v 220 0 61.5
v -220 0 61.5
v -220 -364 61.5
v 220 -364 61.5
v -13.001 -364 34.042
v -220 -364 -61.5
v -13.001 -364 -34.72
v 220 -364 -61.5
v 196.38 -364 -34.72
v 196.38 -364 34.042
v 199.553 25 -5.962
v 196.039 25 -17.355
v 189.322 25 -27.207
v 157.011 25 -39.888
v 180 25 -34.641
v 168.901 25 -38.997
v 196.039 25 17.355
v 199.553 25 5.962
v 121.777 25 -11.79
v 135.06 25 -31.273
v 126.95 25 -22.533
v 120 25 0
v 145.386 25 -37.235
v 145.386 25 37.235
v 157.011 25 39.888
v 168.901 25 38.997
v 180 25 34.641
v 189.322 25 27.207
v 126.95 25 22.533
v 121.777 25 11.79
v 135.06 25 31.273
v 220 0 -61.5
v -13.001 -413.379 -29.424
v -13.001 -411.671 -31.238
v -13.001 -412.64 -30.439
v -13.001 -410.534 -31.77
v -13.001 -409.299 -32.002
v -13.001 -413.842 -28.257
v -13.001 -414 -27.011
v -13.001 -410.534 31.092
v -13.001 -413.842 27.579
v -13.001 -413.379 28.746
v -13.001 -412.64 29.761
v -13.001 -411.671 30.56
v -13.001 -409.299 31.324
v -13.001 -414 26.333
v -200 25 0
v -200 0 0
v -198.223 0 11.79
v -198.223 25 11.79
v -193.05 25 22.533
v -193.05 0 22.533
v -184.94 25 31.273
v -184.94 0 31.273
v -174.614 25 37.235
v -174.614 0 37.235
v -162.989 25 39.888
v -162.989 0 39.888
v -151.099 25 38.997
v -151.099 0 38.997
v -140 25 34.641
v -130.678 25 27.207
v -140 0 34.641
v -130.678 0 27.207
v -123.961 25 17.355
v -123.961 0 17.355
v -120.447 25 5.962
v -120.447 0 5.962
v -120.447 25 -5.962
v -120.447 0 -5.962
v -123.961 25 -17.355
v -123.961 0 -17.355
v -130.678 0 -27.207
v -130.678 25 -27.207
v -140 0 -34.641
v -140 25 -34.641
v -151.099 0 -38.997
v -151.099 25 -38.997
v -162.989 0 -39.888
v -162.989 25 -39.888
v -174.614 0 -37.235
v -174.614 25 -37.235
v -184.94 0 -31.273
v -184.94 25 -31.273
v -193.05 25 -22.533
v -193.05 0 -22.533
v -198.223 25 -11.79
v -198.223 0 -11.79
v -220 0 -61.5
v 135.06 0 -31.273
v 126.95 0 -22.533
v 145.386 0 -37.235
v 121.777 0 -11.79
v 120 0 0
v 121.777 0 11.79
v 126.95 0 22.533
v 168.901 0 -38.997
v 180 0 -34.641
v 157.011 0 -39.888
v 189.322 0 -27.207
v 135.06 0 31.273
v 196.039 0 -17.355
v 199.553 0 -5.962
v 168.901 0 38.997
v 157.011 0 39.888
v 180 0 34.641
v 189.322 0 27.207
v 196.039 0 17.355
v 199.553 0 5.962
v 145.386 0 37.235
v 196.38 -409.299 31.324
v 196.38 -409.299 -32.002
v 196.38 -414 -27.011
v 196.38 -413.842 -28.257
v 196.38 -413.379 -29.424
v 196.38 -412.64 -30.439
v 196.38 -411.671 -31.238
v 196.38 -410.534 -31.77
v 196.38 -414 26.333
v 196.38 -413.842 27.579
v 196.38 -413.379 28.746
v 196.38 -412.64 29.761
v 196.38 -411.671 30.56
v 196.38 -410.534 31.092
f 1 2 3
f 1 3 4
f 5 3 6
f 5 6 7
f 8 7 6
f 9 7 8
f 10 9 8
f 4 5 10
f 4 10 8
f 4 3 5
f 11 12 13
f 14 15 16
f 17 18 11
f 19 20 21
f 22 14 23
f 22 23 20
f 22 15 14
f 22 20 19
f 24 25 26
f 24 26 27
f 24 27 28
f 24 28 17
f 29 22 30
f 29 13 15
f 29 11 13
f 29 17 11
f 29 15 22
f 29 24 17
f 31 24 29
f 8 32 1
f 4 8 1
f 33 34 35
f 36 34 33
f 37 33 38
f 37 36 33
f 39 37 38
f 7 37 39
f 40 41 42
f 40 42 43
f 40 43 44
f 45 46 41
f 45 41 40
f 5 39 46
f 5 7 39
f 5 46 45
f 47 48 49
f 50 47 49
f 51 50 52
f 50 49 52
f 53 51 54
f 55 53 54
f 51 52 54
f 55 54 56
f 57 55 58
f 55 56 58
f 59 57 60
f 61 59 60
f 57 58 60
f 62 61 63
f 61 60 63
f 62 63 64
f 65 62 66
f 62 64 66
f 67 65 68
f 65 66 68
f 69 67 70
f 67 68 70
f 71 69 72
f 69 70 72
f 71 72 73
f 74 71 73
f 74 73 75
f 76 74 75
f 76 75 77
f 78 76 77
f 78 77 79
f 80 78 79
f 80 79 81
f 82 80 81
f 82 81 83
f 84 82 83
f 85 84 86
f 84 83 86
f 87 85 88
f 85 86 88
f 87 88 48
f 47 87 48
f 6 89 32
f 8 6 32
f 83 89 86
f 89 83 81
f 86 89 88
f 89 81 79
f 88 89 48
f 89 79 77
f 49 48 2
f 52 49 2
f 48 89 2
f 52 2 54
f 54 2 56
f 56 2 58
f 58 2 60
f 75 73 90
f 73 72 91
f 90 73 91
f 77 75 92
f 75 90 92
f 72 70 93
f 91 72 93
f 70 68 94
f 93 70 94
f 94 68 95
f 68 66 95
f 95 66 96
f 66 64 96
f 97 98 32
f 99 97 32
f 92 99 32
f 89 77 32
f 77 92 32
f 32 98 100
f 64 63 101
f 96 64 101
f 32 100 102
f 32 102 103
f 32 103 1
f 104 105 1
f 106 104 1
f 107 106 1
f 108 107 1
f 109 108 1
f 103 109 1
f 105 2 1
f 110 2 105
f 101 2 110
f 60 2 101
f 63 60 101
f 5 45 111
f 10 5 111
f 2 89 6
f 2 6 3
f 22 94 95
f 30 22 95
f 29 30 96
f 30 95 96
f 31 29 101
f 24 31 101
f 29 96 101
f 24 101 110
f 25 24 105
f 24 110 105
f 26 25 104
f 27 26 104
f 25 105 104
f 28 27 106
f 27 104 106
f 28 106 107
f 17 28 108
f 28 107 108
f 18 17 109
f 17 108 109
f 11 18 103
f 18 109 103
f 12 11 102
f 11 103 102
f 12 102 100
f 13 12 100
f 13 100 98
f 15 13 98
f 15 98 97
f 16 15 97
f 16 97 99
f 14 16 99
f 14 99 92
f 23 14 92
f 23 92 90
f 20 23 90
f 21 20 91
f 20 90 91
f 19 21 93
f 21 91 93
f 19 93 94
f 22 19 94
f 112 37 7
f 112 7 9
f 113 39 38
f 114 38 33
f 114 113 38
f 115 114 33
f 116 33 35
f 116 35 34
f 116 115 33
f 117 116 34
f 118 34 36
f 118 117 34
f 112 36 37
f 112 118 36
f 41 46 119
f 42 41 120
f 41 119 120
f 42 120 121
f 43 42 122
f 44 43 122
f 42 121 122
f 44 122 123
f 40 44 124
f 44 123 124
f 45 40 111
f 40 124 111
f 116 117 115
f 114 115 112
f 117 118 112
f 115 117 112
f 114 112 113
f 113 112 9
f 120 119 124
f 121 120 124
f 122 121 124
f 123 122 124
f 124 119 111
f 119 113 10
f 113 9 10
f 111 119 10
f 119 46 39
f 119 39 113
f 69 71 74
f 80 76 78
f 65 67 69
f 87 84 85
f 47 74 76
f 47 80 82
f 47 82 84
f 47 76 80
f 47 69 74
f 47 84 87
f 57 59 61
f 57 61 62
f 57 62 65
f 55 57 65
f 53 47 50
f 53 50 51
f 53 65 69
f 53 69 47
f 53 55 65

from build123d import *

# Parameters (mm, degrees)
F0_W       = 440
F0_H       = 123
F1_DEPTH   = 364
F2_R       = 40
F3_DEPTH   = 25
F4_W       = 209.3812078238
F4_H       = 68.7625966966
F5_DEPTH   = 50
F6_SIZE2   = 2.99999
F6_SIZE    = 49.99999
F6_2_SIZE2 = 2.99999
F6_2_SIZE  = 49.99999
F7_R       = 5


# Not quite as in the source:
# - a fillet or chamfer is up to 0.001 mm smaller than in the source, because OpenCascade refuses the exact size


with BuildPart() as f1:
    # F0 (on Front) → F1 (new body)
    with BuildSketch(Plane.XZ):
        Rectangle(F0_W, F0_H)
    extrude(amount=F1_DEPTH)

    # F2 (on face) → F3 (join)
    with BuildSketch(Plane(origin=(0, 0, 0), x_dir=(-1, 0, 0), z_dir=(0, 1, 0))):
        with Locations((-160, 0)):
            Circle(F2_R)
        with Locations((160, 0)):
            Circle(F2_R)
    extrude(amount=F3_DEPTH)

    # F4 (on face) → F5 (join)
    with BuildSketch(Plane.XZ.offset(364)):
        with Locations((91.689683497, -0.3388542682)):
            Rectangle(F4_W, F4_H)
    extrude(amount=F5_DEPTH)

    # F6 (size 50 and 3 in the source; OpenCascade refuses exactly that, so slightly less here)
    f6_edges = [f1.edges().sort_by_distance(p)[0] for p in [
        (91.689683, -414, 34.042444),
    ]]
    f6_side = f1.faces().sort_by_distance((91.689683, -389, 34.042444))[0]
    chamfer(f6_edges, length=F6_SIZE, length2=F6_SIZE2, reference=f6_side)

    # F6#2 (size 50 and 3 in the source; OpenCascade refuses exactly that, so slightly less here)
    f6_2_edges = [f1.edges().sort_by_distance(p)[0] for p in [
        (91.689683, -414, -34.720153),
    ]]
    f6_2_side = f1.faces().sort_by_distance((91.689683, -389, -34.720153))[0]
    chamfer(f6_2_edges, length=F6_2_SIZE, length2=F6_2_SIZE2, reference=f6_2_side)

    # F7
    f7_edges = [f1.edges().sort_by_distance(p)[0] for p in [
        (91.689683, -414, 31.042454),
        (91.689683, -414, -31.720163),
    ]]
    fillet(f7_edges, radius=F7_R)


solid = f1.part
